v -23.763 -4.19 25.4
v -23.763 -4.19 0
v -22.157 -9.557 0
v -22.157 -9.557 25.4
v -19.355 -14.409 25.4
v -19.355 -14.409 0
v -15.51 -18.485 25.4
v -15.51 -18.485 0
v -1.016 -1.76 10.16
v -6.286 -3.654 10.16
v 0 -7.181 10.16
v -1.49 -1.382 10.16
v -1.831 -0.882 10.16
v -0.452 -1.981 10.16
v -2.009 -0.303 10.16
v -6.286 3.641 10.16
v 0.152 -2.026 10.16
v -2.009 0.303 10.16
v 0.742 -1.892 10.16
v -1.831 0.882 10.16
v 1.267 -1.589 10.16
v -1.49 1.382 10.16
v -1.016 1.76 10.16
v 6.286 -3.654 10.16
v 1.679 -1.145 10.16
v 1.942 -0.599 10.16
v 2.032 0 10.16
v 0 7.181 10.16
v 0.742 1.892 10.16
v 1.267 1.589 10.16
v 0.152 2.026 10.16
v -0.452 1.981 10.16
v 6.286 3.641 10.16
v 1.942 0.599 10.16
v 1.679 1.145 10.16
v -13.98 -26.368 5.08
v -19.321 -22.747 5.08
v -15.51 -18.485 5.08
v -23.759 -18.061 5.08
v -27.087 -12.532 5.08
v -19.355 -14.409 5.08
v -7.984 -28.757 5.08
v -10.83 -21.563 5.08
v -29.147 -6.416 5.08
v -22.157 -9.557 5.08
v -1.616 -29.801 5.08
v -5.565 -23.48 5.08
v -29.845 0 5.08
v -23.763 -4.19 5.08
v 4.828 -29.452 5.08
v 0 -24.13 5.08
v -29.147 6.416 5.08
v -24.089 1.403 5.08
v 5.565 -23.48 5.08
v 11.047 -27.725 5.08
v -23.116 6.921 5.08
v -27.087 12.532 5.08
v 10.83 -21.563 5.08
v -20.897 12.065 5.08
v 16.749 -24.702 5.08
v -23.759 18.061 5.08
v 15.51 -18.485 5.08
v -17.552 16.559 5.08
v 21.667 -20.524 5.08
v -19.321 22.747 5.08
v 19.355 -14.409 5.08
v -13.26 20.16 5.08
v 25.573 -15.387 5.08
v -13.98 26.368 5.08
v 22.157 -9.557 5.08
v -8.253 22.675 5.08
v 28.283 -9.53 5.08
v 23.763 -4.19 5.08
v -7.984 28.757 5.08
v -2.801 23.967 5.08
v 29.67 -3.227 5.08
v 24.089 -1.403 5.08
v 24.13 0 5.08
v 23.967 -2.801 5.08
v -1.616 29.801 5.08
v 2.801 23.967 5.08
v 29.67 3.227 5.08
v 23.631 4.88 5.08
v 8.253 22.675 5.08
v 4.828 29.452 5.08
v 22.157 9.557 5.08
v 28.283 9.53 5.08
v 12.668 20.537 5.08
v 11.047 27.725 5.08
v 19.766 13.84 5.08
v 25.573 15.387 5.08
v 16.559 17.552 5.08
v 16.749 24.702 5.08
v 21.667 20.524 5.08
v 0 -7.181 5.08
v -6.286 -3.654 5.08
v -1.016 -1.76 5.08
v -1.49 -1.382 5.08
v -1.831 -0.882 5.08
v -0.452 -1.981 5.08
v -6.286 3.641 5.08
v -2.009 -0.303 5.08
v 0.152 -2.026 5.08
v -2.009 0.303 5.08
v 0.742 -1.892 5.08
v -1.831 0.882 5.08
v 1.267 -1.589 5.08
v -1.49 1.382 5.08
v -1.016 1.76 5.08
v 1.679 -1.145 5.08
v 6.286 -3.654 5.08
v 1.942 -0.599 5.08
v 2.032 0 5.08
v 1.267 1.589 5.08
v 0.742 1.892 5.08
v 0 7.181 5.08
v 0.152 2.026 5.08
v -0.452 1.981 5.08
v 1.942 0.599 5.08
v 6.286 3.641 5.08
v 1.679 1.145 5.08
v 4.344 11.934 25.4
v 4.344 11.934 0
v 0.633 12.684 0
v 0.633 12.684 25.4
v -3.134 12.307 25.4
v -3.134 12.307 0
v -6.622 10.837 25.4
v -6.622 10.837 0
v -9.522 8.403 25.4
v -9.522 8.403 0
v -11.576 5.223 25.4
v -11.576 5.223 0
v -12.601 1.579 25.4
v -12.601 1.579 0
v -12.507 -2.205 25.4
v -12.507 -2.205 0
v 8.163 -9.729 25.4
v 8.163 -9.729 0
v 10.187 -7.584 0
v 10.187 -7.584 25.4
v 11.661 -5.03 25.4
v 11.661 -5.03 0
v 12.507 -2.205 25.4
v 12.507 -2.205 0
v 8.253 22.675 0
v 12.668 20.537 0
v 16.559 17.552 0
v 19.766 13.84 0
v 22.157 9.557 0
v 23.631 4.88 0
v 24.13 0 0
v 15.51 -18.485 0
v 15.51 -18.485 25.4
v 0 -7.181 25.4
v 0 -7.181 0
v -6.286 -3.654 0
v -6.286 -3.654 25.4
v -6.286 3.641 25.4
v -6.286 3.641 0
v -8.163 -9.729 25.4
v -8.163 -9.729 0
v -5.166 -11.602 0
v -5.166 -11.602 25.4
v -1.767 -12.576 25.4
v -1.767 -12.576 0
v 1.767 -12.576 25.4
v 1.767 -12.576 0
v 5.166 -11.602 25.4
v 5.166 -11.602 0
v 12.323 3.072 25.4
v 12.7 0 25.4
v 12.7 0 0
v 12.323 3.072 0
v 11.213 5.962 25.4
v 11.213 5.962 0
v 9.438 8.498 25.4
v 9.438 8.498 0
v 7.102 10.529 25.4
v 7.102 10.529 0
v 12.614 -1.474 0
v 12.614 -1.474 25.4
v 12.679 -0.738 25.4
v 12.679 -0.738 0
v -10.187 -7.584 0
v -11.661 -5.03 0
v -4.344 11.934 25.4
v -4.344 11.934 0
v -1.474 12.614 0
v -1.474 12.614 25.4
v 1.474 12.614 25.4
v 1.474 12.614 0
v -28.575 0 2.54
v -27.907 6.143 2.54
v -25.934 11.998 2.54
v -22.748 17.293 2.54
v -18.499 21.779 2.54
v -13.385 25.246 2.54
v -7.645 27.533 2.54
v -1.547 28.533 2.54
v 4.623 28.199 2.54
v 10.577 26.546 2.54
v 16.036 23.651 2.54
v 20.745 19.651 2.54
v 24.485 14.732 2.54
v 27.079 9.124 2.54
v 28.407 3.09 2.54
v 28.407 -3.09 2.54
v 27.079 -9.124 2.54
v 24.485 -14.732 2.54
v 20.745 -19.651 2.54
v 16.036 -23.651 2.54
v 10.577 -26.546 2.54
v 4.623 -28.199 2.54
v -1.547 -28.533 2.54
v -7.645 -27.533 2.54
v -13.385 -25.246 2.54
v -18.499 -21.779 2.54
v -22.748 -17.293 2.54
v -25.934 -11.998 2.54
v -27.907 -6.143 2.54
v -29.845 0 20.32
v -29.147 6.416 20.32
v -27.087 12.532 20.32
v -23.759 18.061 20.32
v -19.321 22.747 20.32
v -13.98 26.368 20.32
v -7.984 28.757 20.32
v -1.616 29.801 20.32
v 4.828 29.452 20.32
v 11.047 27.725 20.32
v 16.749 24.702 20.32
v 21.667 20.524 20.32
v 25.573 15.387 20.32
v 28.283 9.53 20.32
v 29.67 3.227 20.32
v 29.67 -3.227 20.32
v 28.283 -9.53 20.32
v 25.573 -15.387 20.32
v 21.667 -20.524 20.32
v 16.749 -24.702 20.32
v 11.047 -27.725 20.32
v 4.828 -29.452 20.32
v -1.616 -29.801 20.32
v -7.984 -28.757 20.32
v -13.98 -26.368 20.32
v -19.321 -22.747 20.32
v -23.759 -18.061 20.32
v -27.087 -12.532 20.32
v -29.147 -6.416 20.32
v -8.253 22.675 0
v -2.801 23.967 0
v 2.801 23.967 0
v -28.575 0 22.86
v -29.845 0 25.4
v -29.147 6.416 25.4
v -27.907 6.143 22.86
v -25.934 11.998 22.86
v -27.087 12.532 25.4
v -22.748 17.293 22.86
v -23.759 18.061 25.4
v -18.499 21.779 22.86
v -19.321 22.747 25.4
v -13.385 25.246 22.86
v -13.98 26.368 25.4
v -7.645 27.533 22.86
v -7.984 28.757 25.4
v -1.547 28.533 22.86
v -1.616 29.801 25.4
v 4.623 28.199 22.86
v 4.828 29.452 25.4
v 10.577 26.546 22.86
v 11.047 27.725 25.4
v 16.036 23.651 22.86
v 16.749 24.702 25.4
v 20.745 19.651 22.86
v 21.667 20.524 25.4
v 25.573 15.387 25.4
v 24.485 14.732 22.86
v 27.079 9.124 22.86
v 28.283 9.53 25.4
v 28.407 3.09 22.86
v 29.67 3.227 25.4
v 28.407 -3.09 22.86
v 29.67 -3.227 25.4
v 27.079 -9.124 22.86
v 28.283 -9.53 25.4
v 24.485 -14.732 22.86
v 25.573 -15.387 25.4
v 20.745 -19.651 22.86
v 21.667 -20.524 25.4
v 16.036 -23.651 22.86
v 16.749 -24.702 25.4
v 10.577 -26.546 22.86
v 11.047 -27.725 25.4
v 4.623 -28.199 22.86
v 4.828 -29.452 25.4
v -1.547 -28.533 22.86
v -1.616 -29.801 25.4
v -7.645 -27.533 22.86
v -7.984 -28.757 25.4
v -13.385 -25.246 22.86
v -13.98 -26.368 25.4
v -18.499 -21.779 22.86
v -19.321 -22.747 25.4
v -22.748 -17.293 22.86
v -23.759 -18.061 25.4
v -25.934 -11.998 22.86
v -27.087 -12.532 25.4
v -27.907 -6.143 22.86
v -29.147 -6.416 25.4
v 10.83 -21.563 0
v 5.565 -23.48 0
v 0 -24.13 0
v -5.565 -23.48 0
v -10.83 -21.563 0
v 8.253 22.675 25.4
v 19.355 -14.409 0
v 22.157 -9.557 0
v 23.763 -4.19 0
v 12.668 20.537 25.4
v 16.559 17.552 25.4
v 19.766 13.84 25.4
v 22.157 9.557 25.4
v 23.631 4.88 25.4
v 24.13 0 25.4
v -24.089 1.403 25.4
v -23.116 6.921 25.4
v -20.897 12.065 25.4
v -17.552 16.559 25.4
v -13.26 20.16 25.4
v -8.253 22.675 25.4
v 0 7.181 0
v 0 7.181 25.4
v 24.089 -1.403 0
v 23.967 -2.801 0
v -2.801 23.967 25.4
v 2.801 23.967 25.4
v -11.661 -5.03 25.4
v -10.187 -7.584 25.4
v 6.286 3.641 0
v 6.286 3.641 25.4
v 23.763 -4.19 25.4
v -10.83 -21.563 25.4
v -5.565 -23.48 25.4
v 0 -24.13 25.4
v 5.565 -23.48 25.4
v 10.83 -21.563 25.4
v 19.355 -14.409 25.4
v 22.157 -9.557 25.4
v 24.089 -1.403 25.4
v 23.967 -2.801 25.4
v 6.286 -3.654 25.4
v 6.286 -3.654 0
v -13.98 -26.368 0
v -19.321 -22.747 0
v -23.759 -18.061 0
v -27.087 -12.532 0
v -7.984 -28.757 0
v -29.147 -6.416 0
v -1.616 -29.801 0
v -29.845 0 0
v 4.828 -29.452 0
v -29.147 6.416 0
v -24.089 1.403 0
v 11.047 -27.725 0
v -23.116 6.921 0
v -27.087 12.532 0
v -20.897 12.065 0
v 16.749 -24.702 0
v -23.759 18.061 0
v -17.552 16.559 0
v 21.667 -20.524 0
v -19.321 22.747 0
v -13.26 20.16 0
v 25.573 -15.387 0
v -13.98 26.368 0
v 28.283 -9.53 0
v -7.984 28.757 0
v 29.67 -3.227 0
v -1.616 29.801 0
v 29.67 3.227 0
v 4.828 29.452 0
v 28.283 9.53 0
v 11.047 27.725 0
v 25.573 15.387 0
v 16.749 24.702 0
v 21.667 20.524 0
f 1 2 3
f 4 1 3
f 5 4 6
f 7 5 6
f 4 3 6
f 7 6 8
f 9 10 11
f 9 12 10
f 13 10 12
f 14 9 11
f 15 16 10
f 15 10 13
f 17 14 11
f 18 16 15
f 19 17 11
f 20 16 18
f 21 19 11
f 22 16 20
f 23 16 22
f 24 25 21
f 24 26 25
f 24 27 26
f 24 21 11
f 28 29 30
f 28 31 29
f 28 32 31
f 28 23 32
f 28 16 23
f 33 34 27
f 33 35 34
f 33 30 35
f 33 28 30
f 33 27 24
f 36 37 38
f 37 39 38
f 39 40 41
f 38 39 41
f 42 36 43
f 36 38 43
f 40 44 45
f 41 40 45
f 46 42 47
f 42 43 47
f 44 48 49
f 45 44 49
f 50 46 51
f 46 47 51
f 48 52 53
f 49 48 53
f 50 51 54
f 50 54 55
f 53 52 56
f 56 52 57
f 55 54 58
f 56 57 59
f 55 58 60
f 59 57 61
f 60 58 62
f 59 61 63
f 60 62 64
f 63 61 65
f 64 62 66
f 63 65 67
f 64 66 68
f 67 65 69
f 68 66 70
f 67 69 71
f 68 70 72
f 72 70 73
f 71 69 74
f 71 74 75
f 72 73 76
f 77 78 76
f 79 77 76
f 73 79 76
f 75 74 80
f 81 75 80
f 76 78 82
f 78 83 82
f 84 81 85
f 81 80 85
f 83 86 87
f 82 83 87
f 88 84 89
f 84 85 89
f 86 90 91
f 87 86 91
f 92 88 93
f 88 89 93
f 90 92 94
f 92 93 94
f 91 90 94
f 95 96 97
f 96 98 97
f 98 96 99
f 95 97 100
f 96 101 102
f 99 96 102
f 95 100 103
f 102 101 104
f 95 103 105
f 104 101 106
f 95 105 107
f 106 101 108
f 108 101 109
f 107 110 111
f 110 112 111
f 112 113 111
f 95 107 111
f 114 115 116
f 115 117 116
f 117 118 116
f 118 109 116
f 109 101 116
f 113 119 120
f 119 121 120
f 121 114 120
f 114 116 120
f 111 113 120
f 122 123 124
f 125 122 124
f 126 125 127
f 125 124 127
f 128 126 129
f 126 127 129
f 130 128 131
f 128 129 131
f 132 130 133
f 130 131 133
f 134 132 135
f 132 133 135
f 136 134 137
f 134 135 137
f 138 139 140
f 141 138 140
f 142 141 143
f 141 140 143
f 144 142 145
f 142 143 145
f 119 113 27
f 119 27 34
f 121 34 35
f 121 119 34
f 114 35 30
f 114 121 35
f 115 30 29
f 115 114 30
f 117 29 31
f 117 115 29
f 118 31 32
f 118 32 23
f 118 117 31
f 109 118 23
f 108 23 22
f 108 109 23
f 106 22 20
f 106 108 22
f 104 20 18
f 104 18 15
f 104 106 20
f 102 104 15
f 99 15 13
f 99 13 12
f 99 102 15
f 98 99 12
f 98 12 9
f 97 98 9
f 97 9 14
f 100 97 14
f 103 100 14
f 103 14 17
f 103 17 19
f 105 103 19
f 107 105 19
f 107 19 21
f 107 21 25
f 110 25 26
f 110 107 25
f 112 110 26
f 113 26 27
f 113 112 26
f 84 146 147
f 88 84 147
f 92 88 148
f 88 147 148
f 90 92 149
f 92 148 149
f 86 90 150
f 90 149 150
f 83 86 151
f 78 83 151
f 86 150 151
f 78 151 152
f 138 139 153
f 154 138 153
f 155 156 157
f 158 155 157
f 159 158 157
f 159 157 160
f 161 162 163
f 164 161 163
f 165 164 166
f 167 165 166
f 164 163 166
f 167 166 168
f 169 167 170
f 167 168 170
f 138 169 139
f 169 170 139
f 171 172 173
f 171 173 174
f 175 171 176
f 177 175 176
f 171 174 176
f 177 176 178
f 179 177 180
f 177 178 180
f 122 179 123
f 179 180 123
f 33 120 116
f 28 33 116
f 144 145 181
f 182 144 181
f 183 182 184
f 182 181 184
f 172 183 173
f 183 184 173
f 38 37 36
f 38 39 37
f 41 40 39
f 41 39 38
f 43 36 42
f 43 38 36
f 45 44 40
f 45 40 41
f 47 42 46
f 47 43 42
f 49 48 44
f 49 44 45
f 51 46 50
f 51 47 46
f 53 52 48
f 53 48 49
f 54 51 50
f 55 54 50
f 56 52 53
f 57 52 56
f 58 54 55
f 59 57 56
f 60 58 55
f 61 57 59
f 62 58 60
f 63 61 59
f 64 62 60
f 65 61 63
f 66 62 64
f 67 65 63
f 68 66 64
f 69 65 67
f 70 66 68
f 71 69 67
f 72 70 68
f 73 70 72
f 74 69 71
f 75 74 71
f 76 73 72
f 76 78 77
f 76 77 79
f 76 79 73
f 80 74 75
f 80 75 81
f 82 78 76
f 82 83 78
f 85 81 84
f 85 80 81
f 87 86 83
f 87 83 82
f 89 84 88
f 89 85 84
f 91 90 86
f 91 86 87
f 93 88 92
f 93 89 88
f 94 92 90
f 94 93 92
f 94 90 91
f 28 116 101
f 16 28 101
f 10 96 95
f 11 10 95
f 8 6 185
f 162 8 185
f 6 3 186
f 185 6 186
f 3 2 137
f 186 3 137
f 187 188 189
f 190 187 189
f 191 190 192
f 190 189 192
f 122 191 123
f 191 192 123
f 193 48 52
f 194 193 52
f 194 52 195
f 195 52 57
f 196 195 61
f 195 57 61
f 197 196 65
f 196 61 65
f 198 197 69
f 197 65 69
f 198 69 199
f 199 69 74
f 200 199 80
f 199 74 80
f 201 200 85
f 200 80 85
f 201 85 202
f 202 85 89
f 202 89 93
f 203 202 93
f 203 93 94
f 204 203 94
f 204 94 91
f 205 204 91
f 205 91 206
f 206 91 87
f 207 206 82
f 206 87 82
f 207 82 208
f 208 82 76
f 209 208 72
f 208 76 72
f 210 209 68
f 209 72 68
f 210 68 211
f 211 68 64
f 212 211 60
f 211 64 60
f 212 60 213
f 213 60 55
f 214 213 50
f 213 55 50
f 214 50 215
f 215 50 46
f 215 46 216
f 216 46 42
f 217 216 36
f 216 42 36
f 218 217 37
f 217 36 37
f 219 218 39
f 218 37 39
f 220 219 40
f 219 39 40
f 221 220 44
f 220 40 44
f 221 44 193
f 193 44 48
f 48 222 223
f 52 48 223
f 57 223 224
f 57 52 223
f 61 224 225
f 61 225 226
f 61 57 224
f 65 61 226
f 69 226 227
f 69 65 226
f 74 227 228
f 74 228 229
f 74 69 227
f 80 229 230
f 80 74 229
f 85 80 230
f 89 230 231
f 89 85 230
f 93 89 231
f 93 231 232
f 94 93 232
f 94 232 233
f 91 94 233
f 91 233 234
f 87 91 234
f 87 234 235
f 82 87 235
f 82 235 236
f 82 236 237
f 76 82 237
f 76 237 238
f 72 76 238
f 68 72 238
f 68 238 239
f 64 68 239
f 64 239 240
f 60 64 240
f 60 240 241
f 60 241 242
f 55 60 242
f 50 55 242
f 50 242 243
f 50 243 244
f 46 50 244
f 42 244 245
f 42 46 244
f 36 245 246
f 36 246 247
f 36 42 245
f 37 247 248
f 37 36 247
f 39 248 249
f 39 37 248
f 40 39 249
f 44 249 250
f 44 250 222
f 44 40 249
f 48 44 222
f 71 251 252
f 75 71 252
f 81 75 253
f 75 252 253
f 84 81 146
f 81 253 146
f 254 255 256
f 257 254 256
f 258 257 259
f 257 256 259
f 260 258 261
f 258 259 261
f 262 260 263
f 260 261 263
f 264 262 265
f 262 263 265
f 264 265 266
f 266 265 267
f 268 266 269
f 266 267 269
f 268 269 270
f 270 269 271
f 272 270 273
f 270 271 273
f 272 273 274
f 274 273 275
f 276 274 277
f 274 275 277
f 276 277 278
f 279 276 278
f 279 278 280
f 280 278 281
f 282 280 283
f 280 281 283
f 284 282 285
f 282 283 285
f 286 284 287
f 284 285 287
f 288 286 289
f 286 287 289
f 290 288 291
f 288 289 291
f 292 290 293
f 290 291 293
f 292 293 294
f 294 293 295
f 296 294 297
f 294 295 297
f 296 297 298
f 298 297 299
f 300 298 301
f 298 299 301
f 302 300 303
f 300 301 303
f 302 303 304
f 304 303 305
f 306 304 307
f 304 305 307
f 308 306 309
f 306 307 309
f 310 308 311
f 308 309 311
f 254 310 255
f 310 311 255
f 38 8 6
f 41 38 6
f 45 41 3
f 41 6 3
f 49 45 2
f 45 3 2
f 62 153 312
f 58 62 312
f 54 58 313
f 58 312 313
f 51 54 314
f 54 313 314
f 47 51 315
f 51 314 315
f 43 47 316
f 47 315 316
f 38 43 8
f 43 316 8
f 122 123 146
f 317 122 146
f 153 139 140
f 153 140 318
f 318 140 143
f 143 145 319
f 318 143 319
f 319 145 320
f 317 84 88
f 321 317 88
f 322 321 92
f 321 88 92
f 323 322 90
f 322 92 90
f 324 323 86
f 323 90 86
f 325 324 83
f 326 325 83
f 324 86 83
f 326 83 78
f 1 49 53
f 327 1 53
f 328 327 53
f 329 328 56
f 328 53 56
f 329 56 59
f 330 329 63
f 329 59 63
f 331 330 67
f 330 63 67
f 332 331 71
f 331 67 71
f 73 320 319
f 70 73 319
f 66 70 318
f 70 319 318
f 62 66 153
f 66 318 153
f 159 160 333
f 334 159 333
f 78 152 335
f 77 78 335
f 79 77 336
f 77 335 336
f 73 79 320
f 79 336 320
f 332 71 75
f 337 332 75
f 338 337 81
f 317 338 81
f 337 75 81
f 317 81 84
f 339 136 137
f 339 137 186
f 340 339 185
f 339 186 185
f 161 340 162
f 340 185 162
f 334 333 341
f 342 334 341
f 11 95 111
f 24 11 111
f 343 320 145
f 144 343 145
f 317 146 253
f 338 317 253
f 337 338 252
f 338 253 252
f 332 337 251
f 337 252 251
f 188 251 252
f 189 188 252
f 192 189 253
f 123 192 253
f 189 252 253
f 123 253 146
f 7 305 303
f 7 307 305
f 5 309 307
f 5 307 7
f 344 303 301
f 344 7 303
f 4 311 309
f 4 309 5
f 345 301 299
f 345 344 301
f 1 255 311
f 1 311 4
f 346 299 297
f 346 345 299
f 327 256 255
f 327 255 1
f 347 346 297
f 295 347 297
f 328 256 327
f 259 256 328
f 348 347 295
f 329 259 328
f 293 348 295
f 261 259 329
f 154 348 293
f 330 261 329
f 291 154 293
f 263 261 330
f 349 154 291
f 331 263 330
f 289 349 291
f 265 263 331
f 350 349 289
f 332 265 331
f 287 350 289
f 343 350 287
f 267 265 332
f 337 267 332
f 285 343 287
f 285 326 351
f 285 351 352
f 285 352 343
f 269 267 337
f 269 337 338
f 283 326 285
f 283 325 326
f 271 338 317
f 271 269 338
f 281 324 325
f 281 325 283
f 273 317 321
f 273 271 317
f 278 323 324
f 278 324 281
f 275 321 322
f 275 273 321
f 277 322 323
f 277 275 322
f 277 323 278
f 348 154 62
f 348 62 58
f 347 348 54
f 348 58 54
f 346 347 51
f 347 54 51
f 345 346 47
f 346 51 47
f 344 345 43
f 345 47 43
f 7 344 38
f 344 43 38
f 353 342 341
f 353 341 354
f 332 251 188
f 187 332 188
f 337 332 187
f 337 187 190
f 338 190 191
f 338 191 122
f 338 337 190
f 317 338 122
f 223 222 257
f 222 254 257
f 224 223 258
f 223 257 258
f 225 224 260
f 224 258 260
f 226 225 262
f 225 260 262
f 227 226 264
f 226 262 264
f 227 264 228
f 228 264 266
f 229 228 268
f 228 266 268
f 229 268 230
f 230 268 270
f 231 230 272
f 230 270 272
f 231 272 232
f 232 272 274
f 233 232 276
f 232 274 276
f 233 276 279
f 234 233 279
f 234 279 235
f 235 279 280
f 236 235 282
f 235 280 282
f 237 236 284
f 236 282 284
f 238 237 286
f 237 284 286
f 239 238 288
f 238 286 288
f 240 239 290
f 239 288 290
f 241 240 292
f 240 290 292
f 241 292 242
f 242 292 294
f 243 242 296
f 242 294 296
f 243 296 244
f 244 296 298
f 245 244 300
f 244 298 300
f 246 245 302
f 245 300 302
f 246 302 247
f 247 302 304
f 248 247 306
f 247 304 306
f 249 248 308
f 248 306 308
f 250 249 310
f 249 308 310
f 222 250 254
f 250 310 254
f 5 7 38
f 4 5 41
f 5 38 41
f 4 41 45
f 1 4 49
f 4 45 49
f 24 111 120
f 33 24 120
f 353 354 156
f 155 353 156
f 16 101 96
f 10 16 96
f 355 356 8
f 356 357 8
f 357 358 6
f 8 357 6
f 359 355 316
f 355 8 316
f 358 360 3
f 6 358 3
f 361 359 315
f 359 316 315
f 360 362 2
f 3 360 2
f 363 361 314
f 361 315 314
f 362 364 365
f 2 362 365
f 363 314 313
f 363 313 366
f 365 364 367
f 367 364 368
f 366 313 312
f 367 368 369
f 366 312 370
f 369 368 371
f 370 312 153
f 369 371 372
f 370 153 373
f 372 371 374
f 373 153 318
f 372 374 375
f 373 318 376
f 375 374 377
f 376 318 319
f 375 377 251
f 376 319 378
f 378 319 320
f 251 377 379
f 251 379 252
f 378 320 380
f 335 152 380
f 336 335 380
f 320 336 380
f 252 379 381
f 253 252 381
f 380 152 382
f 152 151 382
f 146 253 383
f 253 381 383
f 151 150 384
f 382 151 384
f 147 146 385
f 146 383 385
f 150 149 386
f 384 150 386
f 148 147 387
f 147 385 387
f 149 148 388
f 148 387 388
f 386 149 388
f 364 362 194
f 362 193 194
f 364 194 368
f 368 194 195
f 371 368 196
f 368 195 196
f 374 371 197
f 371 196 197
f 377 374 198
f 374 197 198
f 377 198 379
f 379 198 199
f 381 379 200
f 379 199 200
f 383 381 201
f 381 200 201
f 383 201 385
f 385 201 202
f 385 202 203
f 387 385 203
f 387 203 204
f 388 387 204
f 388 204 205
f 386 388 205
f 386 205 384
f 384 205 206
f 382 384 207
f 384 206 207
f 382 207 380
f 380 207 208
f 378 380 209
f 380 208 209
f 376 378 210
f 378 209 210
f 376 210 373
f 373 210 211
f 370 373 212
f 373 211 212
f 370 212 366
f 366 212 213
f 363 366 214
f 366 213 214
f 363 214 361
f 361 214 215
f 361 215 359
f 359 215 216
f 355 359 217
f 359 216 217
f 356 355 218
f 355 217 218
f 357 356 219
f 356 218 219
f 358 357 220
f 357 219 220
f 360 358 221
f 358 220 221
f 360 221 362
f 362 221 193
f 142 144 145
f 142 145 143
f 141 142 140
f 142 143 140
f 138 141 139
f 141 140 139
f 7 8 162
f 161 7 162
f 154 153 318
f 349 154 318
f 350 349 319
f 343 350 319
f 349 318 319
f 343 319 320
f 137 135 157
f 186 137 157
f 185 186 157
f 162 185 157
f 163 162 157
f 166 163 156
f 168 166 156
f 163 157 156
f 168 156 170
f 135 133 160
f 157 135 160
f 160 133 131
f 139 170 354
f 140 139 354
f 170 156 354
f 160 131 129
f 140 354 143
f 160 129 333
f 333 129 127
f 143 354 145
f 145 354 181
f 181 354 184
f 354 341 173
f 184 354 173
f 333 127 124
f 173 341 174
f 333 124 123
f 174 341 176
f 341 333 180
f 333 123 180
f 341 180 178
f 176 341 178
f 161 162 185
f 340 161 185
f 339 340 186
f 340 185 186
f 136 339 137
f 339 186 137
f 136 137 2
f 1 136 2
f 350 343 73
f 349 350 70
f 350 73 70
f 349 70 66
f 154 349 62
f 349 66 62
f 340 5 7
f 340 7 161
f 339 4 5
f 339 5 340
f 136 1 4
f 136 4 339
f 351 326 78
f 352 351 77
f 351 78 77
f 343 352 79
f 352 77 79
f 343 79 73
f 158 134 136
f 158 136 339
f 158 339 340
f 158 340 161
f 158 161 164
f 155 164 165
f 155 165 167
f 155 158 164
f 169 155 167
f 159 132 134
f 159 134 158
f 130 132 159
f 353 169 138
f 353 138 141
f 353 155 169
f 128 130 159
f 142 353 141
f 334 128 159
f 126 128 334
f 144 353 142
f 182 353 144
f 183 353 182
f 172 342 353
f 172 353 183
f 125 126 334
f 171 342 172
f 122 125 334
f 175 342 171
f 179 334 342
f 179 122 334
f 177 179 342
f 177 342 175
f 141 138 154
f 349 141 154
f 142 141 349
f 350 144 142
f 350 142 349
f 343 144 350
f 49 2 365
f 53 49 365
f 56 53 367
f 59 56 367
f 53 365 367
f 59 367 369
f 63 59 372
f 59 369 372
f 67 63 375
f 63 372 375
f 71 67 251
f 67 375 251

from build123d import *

# Parameters (mm, degrees)
F0_R     = 29.845
F0_R_2   = 28.575
F1_DEPTH = 5.08
F4_DEPTH = 25.4
F5_DEPTH = 20.32
F7_DEPTH = 25.4
F0_R_3   = 2.032
F8_DEPTH = 5.08


# Not quite as in the source:
# - a feature names something its author has since deleted; it is built from what else it names


with BuildPart() as f1:
    # F0 (on Top) → F1 (new body)
    with BuildSketch(Plane.XY):
        Circle(F0_R)
        Circle(F0_R_2, mode=Mode.SUBTRACT)
        Circle(F0_R_2)
        with BuildLine():
            ThreePointArc((8.2529460584, 22.6747829396), (19.7661388287, 13.8403994092), (24.13, 0))
            ThreePointArc((24.13, 0), (24.038178065, -2.1030680725), (23.7634110802, -4.1901305271))
            ThreePointArc((23.7634110802, -4.1901305271), (20.8971929933, -12.065), (15.5104650217, -18.4846524125))
            ThreePointArc((15.5104650217, -18.4846524125), (0, -24.13), (-15.5104650217, -18.4846524125))
            ThreePointArc((-15.5104650217, -18.4846524125), (-20.8971929933, -12.065), (-23.7634110802, -4.1901305271))
            ThreePointArc((-23.7634110802, -4.1901305271), (-20.8971929933, 12.065), (-8.2529460584, 22.6747829396))
            ThreePointArc((-8.2529460584, 22.6747829396), (0, 24.13), (8.2529460584, 22.6747829396))
        make_face(mode=Mode.SUBTRACT)
    extrude(amount=F1_DEPTH)

    # F2 (on Front) → F3 (revolve, cut)
    with BuildSketch(Plane.XZ):
        Polygon((-28.575, 2.54), (-29.845, 5.08), (-29.845, 0), align=None)
        Polygon((-28.575, 22.86), (-29.845, 25.4), (-29.845, 20.32), align=None)
    revolve(axis=Axis((0, 0, 0.2129347995), (0, 0, -1)), mode=Mode.SUBTRACT)


with BuildPart() as f4:
    # F0 (on Top) → F4 (new body)
    with BuildSketch(Plane.XY):
        with BuildLine():
            Line((-12.5070584633, -2.2053318564), (-23.7634110802, -4.1901305271))
            ThreePointArc((-23.7634110802, -4.1901305271), (-20.8971929933, -12.065), (-15.5104650217, -18.4846524125))
            Line((-15.5104650217, -18.4846524125), (-8.163402643, -9.7287644276))
            ThreePointArc((-8.163402643, -9.7287644276), (-10.9985226281, -6.35), (-12.5070584633, -2.2053318564))
        make_face()
    extrude(amount=F4_DEPTH)


with BuildPart() as f4b:
    # F0 (on Top) → F4, piece 2 (new body)
    with BuildSketch(Plane.XY):
        with BuildLine():
            Line((4.3436558202, 11.934096284), (8.2529460584, 22.6747829396))
            ThreePointArc((8.2529460584, 22.6747829396), (0, 24.13), (-8.2529460584, 22.6747829396))
            Line((-8.2529460584, 22.6747829396), (-4.3436558202, 11.934096284))
            ThreePointArc((-4.3436558202, 11.934096284), (0, 12.7), (4.3436558202, 11.934096284))
        make_face()
    extrude(amount=F4_DEPTH)


with BuildPart() as f4c:
    # F0 (on Top) → F4, piece 3 (new body)
    with BuildSketch(Plane.XY):
        with BuildLine():
            ThreePointArc((15.5104650217, -18.4846524125), (20.8971929933, -12.065), (23.7634110802, -4.1901305271))
            Line((23.7634110802, -4.1901305271), (12.5070584633, -2.2053318564))
            ThreePointArc((12.5070584633, -2.2053318564), (10.9985226281, -6.35), (8.163402643, -9.7287644276))
            Line((8.163402643, -9.7287644276), (15.5104650217, -18.4846524125))
        make_face()
    extrude(amount=F4_DEPTH)


with BuildPart() as f5:
    # F5 (new, through all): a face of the model
    f5_faces = [f1.part.faces().sort_by_distance(p)[0] for p in [
        (29.0008559246, 0, 5.08),
    ]]
    extrude(f5_faces, amount=F5_DEPTH)

    # F2 (on Front) → F6 (revolve, cut)
    with BuildSketch(Plane.XZ):
        Polygon((-28.575, 22.86), (-29.845, 25.4), (-29.845, 20.32), align=None)
    revolve(axis=Axis((0, 0, 0.2129347995), (0, 0, -1)), mode=Mode.SUBTRACT)


with BuildPart() as f7:
    # F0 (on Top) → F7 (new body)
    with BuildSketch(Plane.XY):
        with BuildLine():
            ThreePointArc((12.7, 0), (10.4032309625, 7.2844207417), (4.3436558202, 11.934096284))
            ThreePointArc((4.3436558202, 11.934096284), (0, 12.7), (-4.3436558202, 11.934096284))
            ThreePointArc((-4.3436558202, 11.934096284), (-10.9985226281, 6.35), (-12.5070584633, -2.2053318564))
            ThreePointArc((-12.5070584633, -2.2053318564), (-10.9985226281, -6.35), (-8.163402643, -9.7287644276))
            ThreePointArc((-8.163402643, -9.7287644276), (0, -12.7), (8.163402643, -9.7287644276))
            ThreePointArc((8.163402643, -9.7287644276), (10.9985226281, -6.35), (12.5070584633, -2.2053318564))
            ThreePointArc((12.5070584633, -2.2053318564), (12.6516726658, -1.1068779329), (12.7, 0))
        make_face()
        Polygon((0, 7.1812582227), (6.2865, 3.6409661174), (6.2865, 0), (6.2865, -3.6539388334), (0, -7.1809962018), (-6.2865, -3.6539388334), (-6.2865, 0), (-6.2865, 3.6409661174), align=None, mode=Mode.SUBTRACT)
    extrude(amount=F7_DEPTH)


with BuildPart() as f8:
    # F0 (on Top) → F8 (new body)
    with BuildSketch(Plane.XY):
        Polygon((6.2865, 0), (6.2865, 3.6409661174), (0, 7.1812582227), (-6.2865, 3.6409661174), (-6.2865, 0), (-6.2865, -3.6539388334), (0, -7.1809962018), (6.2865, -3.6539388334), align=None)
        Circle(F0_R_3, mode=Mode.SUBTRACT)
    extrude(amount=F8_DEPTH)


with BuildPart() as f8_1:
    # F9: moved
    add(f8.part.moved(Location((0, 0, 5.08))))


solid = Compound([f1.part, f4.part, f4b.part, f4c.part, f5.part, f7.part, f8_1.part])
